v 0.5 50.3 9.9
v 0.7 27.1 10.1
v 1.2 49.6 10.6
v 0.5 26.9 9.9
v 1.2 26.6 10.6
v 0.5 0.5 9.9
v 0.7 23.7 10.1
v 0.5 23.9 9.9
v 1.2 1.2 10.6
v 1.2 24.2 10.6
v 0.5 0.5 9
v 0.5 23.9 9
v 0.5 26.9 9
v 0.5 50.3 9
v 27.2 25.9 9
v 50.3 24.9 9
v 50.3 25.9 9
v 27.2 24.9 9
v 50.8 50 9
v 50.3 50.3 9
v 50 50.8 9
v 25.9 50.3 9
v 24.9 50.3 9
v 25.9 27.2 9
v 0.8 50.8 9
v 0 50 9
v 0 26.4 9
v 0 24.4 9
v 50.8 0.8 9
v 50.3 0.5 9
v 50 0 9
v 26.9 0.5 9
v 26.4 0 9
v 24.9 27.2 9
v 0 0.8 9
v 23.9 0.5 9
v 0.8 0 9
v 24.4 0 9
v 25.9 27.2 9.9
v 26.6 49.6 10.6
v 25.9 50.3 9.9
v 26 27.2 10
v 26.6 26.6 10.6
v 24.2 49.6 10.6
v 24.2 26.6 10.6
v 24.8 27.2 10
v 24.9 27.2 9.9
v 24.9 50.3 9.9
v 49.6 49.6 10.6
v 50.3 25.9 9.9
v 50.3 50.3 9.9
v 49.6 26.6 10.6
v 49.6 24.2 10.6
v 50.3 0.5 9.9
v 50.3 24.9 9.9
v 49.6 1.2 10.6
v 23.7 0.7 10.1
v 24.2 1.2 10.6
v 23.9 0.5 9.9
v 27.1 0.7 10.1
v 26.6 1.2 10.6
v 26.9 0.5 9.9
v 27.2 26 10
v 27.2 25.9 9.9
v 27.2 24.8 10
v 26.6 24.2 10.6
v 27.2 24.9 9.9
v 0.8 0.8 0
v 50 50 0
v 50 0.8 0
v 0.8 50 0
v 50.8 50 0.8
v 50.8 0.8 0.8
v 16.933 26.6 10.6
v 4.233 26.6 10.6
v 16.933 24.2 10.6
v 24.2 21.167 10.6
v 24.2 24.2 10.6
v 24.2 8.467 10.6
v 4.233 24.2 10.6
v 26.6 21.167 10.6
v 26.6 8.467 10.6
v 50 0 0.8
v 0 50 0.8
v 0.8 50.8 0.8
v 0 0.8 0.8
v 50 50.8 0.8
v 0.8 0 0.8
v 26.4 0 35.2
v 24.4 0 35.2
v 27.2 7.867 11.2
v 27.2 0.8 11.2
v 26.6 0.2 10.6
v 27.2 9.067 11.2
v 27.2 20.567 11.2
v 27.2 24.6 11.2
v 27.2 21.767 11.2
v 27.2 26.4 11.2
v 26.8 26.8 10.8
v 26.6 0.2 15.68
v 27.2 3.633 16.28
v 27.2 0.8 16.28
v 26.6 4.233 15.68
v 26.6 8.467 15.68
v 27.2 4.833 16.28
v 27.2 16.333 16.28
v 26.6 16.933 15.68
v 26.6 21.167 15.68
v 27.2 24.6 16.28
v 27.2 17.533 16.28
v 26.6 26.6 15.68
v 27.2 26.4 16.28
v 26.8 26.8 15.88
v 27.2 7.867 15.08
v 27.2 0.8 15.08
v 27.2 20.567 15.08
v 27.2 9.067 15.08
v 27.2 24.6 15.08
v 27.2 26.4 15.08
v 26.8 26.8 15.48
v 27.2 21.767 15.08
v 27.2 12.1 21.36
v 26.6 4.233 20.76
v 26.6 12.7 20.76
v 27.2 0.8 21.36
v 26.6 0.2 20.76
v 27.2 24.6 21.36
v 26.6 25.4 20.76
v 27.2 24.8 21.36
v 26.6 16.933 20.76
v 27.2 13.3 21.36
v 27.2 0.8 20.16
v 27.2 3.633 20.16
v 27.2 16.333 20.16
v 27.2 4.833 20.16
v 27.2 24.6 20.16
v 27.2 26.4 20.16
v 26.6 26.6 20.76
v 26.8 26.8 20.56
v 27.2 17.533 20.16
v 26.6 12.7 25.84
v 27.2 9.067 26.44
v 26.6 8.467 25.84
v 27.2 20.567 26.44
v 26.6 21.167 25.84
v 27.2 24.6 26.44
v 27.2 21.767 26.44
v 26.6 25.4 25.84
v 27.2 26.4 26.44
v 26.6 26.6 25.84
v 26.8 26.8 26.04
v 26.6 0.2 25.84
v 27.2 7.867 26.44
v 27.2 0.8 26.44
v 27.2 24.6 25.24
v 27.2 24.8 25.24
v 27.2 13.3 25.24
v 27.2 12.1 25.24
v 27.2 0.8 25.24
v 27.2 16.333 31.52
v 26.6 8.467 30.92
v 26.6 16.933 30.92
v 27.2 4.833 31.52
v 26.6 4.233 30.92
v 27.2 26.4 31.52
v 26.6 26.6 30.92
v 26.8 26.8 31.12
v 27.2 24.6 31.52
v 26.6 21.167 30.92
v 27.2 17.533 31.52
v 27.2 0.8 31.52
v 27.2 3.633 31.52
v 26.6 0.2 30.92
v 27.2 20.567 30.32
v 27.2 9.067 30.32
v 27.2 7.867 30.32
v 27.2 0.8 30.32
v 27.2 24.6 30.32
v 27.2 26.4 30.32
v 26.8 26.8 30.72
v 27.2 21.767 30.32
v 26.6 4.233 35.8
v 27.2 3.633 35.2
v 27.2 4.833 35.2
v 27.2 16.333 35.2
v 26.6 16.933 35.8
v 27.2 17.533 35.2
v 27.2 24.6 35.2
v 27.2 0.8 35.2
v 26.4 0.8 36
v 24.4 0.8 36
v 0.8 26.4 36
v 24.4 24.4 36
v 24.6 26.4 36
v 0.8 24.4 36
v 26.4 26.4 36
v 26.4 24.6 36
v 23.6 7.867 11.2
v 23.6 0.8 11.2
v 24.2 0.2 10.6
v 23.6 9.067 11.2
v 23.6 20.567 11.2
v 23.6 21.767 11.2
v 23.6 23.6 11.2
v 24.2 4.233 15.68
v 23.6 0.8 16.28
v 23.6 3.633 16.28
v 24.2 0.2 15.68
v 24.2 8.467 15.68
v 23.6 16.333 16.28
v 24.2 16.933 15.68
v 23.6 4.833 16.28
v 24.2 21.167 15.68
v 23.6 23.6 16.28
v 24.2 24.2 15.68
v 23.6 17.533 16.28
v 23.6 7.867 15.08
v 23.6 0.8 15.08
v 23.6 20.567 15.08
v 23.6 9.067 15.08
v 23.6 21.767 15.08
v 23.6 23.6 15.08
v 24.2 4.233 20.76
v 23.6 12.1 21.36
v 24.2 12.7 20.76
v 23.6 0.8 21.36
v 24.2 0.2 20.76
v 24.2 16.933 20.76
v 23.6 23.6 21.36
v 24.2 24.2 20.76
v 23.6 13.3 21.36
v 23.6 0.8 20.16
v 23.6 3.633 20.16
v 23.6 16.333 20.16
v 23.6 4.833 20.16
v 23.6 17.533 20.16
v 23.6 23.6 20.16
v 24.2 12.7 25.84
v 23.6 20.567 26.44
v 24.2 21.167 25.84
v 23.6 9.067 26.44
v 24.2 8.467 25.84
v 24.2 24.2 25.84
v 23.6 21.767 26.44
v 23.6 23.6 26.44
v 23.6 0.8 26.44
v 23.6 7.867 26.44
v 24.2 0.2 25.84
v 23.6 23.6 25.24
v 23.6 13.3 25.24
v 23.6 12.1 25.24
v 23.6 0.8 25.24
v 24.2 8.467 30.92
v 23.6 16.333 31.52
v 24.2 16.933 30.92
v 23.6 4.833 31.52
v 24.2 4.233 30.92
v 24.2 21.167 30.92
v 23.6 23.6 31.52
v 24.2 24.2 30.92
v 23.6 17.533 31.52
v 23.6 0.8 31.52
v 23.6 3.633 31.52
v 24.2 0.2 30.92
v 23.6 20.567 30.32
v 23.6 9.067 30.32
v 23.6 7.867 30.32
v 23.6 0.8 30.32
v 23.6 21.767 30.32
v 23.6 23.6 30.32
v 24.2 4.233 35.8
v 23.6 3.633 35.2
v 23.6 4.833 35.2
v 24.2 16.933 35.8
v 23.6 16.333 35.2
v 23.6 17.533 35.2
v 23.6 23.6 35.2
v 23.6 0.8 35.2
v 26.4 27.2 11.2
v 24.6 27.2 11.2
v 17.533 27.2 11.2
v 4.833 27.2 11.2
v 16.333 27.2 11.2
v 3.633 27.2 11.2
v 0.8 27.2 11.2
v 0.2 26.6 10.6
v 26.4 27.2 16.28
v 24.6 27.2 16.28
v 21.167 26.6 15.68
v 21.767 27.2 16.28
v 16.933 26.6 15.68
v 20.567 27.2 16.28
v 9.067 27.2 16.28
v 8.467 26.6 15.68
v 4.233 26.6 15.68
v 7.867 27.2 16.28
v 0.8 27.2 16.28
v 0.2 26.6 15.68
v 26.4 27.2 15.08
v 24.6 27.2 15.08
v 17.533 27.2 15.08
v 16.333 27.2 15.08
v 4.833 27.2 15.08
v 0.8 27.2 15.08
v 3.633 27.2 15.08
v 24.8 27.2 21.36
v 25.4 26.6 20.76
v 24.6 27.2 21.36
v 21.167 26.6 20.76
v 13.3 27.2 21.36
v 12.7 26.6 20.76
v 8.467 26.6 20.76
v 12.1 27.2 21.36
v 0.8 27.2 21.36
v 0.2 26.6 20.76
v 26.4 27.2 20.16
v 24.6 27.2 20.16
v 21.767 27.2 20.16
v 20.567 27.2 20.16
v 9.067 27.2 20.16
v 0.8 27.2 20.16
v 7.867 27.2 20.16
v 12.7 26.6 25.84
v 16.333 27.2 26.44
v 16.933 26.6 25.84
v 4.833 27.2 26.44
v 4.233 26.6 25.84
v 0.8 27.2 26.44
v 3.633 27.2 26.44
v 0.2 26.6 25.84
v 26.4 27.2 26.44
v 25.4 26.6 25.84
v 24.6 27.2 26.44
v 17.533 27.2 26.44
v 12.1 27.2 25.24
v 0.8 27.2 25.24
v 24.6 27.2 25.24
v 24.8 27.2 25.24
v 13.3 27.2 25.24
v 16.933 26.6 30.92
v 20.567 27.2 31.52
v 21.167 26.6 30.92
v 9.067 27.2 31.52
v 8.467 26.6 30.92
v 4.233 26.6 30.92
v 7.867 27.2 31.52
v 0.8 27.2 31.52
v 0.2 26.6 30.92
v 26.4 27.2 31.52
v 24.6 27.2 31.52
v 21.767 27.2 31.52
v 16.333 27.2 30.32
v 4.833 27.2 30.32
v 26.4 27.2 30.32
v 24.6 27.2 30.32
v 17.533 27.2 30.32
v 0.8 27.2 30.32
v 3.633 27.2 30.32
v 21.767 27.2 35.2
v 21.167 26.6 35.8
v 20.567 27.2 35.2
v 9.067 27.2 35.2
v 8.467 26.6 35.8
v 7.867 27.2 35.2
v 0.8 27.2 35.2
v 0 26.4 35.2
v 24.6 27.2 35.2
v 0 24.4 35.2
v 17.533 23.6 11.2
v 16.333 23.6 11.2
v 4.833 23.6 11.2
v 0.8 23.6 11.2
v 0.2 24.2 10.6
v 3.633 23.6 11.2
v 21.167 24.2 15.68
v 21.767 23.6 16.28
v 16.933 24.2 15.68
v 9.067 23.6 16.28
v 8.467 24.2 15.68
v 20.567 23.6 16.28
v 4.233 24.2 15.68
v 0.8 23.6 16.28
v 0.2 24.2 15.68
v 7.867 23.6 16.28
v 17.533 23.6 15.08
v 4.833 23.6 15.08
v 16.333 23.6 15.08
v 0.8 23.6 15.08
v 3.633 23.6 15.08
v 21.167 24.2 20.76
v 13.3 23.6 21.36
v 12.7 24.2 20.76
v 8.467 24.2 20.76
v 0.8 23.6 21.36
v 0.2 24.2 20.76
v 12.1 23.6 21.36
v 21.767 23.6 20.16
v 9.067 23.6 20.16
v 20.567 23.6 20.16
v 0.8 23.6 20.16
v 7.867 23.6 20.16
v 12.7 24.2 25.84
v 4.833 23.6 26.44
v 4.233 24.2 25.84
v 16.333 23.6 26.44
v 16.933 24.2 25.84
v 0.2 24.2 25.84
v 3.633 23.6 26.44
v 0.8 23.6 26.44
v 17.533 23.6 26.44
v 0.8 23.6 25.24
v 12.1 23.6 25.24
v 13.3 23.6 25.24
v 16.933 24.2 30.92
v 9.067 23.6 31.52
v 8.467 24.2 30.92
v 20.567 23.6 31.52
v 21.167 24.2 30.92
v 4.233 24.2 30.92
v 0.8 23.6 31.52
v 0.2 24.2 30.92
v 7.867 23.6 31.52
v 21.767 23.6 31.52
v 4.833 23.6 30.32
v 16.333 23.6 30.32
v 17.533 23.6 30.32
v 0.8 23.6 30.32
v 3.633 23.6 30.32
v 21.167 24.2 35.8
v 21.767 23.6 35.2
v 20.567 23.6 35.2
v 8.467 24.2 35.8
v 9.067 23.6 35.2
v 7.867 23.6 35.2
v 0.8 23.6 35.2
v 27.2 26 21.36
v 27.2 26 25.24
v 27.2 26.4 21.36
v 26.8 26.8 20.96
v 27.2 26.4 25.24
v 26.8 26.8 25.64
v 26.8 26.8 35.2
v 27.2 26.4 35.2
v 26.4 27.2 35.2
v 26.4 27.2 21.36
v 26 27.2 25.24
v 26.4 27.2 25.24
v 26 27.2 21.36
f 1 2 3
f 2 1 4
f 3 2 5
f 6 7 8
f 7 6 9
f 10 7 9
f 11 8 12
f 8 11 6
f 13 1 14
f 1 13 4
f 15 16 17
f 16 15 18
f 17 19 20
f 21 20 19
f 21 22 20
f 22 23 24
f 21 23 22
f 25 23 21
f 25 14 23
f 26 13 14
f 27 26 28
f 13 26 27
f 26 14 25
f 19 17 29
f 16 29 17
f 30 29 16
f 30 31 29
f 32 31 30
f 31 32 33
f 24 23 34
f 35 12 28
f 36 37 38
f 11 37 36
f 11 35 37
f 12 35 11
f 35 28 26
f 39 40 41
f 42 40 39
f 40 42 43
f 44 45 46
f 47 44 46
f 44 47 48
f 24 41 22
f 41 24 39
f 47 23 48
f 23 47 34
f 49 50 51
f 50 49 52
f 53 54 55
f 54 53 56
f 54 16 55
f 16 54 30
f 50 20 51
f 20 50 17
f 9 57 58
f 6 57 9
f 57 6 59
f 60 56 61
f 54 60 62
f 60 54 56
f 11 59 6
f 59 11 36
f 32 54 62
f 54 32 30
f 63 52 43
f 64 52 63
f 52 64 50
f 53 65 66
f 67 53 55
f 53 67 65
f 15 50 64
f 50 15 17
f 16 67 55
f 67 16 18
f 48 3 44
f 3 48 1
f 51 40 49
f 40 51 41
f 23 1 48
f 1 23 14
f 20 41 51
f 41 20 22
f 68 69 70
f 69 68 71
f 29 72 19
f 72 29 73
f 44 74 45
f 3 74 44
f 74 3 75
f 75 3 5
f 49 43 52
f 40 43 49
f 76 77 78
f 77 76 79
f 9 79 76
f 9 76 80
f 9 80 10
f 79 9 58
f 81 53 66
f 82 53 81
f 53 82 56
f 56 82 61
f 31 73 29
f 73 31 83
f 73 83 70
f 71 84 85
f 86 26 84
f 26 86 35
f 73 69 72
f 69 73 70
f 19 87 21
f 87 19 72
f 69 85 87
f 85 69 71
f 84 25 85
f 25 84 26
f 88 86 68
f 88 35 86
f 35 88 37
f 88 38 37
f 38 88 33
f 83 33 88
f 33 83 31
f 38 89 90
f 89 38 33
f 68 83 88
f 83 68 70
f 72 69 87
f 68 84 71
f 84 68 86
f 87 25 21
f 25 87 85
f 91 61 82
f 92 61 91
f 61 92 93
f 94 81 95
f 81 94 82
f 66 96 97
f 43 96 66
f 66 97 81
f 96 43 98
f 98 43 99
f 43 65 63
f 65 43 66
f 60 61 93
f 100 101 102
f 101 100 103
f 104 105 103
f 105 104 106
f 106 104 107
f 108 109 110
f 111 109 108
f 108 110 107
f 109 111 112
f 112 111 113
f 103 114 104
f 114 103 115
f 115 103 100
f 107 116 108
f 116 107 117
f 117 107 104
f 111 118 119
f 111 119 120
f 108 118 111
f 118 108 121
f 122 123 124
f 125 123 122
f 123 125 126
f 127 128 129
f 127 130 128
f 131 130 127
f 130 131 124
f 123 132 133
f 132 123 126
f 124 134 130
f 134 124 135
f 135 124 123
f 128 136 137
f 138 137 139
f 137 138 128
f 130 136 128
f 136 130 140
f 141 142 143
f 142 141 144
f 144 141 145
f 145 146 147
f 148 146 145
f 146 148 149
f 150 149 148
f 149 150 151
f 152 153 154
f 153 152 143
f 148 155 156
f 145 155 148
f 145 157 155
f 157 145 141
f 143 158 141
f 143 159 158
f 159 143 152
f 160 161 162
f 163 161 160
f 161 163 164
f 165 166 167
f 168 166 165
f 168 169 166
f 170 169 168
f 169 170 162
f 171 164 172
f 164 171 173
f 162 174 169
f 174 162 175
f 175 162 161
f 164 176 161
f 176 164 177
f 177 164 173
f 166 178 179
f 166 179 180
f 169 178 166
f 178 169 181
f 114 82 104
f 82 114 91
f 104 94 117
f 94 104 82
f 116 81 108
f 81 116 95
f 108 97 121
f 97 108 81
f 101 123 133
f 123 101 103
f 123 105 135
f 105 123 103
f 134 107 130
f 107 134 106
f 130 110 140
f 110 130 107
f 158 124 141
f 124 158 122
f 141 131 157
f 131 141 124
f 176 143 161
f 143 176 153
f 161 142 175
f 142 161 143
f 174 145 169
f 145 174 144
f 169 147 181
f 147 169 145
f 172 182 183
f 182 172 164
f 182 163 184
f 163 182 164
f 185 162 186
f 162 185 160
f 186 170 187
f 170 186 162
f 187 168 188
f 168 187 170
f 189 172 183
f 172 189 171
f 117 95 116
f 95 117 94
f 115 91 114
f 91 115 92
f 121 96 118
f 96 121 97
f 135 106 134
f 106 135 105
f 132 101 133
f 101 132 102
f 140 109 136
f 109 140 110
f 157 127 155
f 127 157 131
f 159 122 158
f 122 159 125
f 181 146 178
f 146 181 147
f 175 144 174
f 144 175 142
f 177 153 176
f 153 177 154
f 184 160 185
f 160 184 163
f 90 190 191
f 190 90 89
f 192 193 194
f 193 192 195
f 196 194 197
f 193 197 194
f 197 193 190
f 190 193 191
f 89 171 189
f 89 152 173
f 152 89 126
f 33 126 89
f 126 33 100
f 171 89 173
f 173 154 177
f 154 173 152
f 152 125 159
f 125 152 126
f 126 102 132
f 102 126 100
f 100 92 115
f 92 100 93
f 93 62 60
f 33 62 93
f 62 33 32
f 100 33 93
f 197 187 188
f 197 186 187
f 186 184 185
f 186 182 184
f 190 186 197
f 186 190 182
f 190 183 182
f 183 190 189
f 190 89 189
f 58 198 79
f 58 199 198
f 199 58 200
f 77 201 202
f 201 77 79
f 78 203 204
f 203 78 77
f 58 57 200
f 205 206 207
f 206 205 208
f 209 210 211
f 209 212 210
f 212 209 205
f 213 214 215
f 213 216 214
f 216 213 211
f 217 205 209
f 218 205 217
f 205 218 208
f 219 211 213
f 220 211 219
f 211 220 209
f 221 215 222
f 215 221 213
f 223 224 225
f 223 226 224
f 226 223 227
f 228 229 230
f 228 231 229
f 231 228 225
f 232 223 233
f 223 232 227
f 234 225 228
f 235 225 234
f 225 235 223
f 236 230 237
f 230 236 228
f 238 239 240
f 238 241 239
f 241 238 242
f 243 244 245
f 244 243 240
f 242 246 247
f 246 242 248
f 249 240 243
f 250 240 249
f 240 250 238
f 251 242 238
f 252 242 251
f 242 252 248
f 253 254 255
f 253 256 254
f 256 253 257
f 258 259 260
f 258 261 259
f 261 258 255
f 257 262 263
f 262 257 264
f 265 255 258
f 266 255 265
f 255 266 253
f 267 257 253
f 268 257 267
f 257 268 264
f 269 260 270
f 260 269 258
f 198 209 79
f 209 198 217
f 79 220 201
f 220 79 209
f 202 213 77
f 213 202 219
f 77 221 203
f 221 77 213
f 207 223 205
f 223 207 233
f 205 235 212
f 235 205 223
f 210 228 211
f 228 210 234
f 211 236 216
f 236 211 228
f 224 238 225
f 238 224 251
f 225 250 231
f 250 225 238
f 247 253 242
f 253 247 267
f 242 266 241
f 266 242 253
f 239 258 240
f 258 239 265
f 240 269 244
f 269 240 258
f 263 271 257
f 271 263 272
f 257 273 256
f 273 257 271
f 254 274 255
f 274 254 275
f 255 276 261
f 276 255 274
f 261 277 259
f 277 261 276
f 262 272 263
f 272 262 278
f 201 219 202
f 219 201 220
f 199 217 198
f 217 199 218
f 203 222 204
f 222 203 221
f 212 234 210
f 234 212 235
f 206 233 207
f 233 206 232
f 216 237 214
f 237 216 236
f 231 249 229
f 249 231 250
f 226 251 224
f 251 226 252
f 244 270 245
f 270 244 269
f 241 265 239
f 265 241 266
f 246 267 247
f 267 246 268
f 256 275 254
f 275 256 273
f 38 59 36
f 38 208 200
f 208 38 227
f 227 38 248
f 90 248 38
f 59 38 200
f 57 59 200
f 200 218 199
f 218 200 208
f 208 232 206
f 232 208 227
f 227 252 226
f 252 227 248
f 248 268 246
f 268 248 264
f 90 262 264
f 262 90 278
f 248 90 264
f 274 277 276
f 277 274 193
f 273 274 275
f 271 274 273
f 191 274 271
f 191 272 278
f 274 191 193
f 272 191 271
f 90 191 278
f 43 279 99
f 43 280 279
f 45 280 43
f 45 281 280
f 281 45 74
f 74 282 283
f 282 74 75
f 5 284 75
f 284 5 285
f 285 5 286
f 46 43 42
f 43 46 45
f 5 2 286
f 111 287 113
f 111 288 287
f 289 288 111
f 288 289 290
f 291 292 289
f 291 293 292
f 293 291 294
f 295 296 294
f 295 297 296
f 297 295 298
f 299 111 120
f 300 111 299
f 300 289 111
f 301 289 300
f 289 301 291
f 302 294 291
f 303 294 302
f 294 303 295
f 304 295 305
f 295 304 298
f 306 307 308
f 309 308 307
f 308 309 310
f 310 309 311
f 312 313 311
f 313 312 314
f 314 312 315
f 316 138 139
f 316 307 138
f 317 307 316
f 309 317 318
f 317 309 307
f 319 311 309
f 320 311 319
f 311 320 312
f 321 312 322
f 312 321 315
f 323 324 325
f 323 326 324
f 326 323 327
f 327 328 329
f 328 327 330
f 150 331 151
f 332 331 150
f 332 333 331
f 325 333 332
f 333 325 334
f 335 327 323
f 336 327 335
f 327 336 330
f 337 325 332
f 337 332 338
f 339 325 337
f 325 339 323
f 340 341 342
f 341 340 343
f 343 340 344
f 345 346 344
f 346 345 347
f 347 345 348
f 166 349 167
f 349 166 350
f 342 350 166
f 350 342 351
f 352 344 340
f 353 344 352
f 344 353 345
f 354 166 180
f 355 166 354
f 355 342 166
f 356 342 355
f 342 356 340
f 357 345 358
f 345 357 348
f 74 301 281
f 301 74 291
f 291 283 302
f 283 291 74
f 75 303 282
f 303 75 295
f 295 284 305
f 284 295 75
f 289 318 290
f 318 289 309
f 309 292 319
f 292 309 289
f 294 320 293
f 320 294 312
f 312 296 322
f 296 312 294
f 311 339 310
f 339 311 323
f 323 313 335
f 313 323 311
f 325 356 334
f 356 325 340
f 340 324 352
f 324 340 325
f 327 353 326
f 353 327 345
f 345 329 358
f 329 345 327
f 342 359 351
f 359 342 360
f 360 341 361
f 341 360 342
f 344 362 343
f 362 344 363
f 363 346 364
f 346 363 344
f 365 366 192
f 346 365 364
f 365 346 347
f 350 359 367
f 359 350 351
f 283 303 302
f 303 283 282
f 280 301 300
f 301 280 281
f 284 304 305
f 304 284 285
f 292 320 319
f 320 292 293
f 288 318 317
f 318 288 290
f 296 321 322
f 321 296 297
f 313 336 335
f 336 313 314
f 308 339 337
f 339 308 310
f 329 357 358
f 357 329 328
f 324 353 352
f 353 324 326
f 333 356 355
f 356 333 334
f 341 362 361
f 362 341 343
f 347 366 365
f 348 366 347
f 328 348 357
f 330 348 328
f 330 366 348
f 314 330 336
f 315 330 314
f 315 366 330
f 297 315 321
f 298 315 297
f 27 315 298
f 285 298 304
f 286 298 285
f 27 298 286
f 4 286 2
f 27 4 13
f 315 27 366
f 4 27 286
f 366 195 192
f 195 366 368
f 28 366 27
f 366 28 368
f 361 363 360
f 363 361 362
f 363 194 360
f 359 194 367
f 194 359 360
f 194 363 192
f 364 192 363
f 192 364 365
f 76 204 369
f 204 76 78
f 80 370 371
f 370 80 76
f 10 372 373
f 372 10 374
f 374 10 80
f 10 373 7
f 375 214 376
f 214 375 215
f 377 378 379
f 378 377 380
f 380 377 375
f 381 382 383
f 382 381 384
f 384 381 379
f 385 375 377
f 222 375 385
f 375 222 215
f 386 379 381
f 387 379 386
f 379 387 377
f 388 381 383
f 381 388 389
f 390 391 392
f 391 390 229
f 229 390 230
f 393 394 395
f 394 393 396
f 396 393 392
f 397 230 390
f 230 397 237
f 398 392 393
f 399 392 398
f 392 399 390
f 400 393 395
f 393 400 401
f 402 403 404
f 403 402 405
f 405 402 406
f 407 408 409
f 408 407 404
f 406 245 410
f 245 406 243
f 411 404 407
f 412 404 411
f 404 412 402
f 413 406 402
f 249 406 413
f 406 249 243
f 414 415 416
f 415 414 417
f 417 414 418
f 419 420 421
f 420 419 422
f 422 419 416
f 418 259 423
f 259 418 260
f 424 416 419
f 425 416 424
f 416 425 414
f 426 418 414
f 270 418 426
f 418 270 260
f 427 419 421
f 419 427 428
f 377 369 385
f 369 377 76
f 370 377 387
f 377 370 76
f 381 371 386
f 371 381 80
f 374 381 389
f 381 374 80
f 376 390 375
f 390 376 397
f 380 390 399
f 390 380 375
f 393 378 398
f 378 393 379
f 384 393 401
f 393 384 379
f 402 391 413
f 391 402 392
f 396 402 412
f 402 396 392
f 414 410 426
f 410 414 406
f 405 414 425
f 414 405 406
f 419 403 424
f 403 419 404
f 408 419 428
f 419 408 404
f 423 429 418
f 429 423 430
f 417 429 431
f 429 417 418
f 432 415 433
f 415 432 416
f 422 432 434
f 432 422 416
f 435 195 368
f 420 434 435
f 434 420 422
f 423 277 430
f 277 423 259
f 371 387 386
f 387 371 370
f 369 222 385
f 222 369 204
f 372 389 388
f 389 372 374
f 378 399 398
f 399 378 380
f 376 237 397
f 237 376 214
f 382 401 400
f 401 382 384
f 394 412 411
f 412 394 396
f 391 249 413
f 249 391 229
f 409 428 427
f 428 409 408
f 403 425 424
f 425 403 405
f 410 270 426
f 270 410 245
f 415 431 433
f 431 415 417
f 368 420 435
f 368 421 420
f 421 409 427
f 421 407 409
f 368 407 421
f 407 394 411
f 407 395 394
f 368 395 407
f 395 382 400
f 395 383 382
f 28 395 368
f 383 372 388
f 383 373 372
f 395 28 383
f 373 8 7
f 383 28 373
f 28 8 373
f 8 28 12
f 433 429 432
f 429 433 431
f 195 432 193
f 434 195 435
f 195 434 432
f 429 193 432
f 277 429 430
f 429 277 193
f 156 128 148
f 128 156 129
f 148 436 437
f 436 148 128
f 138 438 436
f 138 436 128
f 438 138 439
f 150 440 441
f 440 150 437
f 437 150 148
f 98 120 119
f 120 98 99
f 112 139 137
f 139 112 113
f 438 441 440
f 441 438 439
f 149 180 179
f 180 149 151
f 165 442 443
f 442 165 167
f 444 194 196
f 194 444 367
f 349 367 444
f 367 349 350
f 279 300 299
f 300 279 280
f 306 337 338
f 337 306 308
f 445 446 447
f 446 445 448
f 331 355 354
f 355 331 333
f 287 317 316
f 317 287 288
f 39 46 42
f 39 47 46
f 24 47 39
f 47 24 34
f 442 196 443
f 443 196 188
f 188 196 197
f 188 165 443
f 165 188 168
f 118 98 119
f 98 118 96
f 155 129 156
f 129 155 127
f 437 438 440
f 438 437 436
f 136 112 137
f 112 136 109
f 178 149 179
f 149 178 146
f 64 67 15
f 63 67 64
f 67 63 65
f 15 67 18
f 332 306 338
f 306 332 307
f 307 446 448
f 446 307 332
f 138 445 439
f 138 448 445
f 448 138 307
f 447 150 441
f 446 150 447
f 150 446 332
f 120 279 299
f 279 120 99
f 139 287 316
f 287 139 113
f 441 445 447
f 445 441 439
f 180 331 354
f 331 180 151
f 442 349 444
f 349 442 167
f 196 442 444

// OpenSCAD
// file: floor_01_solid.scad
include <libs.scad>;

//floor
*round(2);
diagonal(2,2);
*square(2,2);

//import("AS_full.stl");


module square(xsize,ysize)
{
  difference()
  {
    floor_plate(xsize,ysize);
    grids(xsize,ysize);
  }
}
module diagonal(xsize,ysize)
{
  intersection()
  {
    difference()
    {
      floor_plate(xsize,ysize);
      grids(xsize,ysize);
    }
    translate([0,0,floor_thick/2])hull()
    {
      //we want a slanted portion, so we'll hull two thin slivers that reach to the length
      cube([2*xsize*basis-bevel*2*sqrt(2),ep,floor_thick],center=true);
      cube([2*xsize*basis,ep,floor_thick-bevel*2],center=true);
      cube([ep,2*ysize*basis-bevel*2*sqrt(2),floor_thick],center=true);
      cube([ep,2*ysize*basis,floor_thick-bevel*2],center=true);
    }
    translate([0,0,floor_thick/2])cube([xsize*2*basis-bevel*2,ysize*2*basis-bevel*2,floor_thick],center=true);
  }
}
module round(radius)
{
  intersection()
  {
    difference()
    {
      floor_plate(radius,radius);
      grids(radius,radius);
    }
    hull()
    {
      translate([0,0,bevel])cylinder(r=radius*basis,h=floor_thick-bevel*2,$fn=200);
      cylinder(r=radius*basis-bevel,h=floor_thick,$fn=200);
    }
  }
}
// file: wall_01_solid.scad
include <libs.scad>;

//wall
*linear_wall(4);
round_wall(2);

module linear_wall_base(size)
{
    translate([-wall_width*basis/2,size*basis/2,wall_height/2])hull()
    {
        cube([wall_width*basis-bevel*2,size*basis,wall_height-bevel*2],center=true);
        cube([wall_width*basis-bevel*2,size*basis-bevel*2,wall_height],center=true);
        cube([wall_width*basis,size*basis-bevel*2,wall_height-bevel*2],center=true);
    }
}

module round_wall_base(size)
{
    difference()
    {
        hull()
        {
            translate([0,0,bevel])cylinder(r=size*basis+basis*wall_width,h=wall_height-bevel*2);
            cylinder(r=size*basis+basis*wall_width-bevel,h=wall_height);
        }
        cylinder(r=size*basis,h=wall_height);
        translate([0,0,-ep])cylinder(r1=size*basis+bevel,r2=size*basis,h=bevel);
        translate([0,0,wall_height-bevel+ep])cylinder(r2=size*basis+bevel,r1=size*basis,h=bevel);
    }
}

module linear_brick_grids(size)
{
    //one for each wall level, horizontal
    brick_h=(wall_height-floor_thick)/wall_layers;
    for (ii=[0:wall_layers-1])
    {
        translate([0,size*basis/2,floor_thick+ii*brick_h])rotate([0,45,0])cube([wall_groove*sqrt(2),size*basis*2,wall_groove*sqrt(2)],center=true);
    }
    //vertical
    //one above floor is off by half, then even, then off
    for (ii=[1:1:wall_layers])
    {
        for(jj=[0:.5:size+1])
        {
            translate([0,jj*basis-(ii%6)*basis/6,floor_thick+ii*brick_h-brick_h/2])rotate([0,0,45])cube([wall_groove*sqrt(2),wall_groove*sqrt(2),brick_h],center=true);
        }
    }
}

module round_brick_grids(size)
{
    brick_h=(wall_height-floor_thick)/wall_layers;
    //horizontal
    for (ii=[0:wall_layers-1])
    {
        translate([0,0,floor_thick+ii*brick_h])hull()
        {
            cylinder(r=basis*size+wall_groove,h=ep,center=true);
            cylinder(r=basis*size,h=wall_groove*2,center=true);
        }
    }
    //vertical
    //vertical should be shifted each layer
    for (ii=[1:1:wall_layers])
    {
        for(jj=[0:30/size:120])
        {
            rotate([0,0,jj+(ii%6)*(10/size)])translate([basis*size,0,floor_thick+ii*brick_h-brick_h/2])rotate([0,0,45])cube([wall_groove*sqrt(2),wall_groove*sqrt(2),brick_h],center=true);
        }
    }
}

module round_wall(size)
{
    xx=basis*size+basis*wall_width;
    yy=basis*size+basis*wall_width;
    zz=wall_height;
    difference()
    {
        intersection()
        {
            round_wall_base(size);
            translate([.5*(basis*size+basis*wall_width),.5*(basis*size+basis*wall_width),wall_height/2])hull()
            {
                cube([xx-bevel*2,yy,zz-bevel*2],center=true);
                cube([xx-bevel*2,yy-bevel*2,zz],center=true);
                cube([xx,yy-bevel*2,zz-bevel*2],center=true);
            }
        }
        hull()
        {
            cube([basis*size*2+bevel*2,ep,zz*3],center=true);
            cube([ep,basis*size*2+bevel*2,zz*3],center=true);
        }
        round_brick_grids(size);
    }
}

module linear_wall(size)
{
    difference()
    {
        linear_wall_base(size);
        linear_brick_grids(size);
        *translate([-wall_width*basis,0,0])linear_brick_grids(size);
    }
}
// main file
include <libs.scad>;
use <wall_01_solid.scad>;
use <floor_01_solid.scad>;

*long_mid();
*short_mid();
*tee();
*plus();
corner();

module long_mid()
{
  //floor
  square(2,2);
  //thin interior wall
  translate([basis,0,0])intersection()
  {
    translate([interior_thick/2,0,0])linear_wall(2);
    mirror([-1,0,0])translate([interior_thick/2,0,0])linear_wall(2);
  }
    
}
module short_mid()
{
  //floor
  square(2,2);
  //thin interior wall
  translate([basis,0,0])intersection()
  {
    translate([interior_thick/2,0,0])linear_wall(1);
    mirror([-1,0,0])translate([interior_thick/2,0,0])linear_wall(1);
  }
    
}
module tee()
{
  //floor
  square(2,2);
  //thin interior wall
  translate([basis,0,0])intersection()
  {
    translate([interior_thick/2,0,0])linear_wall(2);
    mirror([-1,0,0])translate([interior_thick/2,0,0])linear_wall(2);
  }
  rotate([0,0,90])translate([basis,-basis,0])intersection()
  {
    translate([interior_thick/2,0,0])linear_wall(1);
    mirror([-1,0,0])translate([interior_thick/2,0,0])linear_wall(1);
  }
    
}
module plus()
{
  //floor
  square(2,2);
  //thin interior wall
  translate([basis,0,0])intersection()
  {
    translate([interior_thick/2,0,0])linear_wall(2);
    mirror([-1,0,0])translate([interior_thick/2,0,0])linear_wall(2);
  }
  rotate([0,0,90])translate([basis,-2*basis,0])intersection()
  {
    translate([interior_thick/2,0,0])linear_wall(2);
    mirror([-1,0,0])translate([interior_thick/2,0,0])linear_wall(2);
  }
    
}
module corner()
{
  //floor
  square(2,2);
  //thin interior wall
  translate([basis,0,0])intersection()
  {
    translate([interior_thick/2,0,0])linear_wall(1);
    mirror([-1,0,0])translate([interior_thick/2,0,0])linear_wall(1);
  }
  rotate([0,0,90])translate([basis,-basis,0])intersection()
  {
    translate([interior_thick/2,0,0])linear_wall(1);
    mirror([-1,0,0])translate([interior_thick/2,0,0])linear_wall(1);
  }
  intersection()
  {
    translate([basis,0,0])intersection()
    {
      translate([interior_thick/2,0,0])linear_wall(1+.5*interior_thick/basis);
      mirror([-1,0,0])translate([interior_thick/2,0,0])linear_wall(1+.5*interior_thick/basis);
    }
    translate([0,basis,0])rotate([0,0,-90])intersection()
    {
      translate([interior_thick/2,0,0])linear_wall(1+.5*interior_thick/basis);
      mirror([-1,0,0])translate([interior_thick/2,0,0])linear_wall(1+.5*interior_thick/basis);
    }
  }
  //1+.5*interior_thick/basis
    
}
